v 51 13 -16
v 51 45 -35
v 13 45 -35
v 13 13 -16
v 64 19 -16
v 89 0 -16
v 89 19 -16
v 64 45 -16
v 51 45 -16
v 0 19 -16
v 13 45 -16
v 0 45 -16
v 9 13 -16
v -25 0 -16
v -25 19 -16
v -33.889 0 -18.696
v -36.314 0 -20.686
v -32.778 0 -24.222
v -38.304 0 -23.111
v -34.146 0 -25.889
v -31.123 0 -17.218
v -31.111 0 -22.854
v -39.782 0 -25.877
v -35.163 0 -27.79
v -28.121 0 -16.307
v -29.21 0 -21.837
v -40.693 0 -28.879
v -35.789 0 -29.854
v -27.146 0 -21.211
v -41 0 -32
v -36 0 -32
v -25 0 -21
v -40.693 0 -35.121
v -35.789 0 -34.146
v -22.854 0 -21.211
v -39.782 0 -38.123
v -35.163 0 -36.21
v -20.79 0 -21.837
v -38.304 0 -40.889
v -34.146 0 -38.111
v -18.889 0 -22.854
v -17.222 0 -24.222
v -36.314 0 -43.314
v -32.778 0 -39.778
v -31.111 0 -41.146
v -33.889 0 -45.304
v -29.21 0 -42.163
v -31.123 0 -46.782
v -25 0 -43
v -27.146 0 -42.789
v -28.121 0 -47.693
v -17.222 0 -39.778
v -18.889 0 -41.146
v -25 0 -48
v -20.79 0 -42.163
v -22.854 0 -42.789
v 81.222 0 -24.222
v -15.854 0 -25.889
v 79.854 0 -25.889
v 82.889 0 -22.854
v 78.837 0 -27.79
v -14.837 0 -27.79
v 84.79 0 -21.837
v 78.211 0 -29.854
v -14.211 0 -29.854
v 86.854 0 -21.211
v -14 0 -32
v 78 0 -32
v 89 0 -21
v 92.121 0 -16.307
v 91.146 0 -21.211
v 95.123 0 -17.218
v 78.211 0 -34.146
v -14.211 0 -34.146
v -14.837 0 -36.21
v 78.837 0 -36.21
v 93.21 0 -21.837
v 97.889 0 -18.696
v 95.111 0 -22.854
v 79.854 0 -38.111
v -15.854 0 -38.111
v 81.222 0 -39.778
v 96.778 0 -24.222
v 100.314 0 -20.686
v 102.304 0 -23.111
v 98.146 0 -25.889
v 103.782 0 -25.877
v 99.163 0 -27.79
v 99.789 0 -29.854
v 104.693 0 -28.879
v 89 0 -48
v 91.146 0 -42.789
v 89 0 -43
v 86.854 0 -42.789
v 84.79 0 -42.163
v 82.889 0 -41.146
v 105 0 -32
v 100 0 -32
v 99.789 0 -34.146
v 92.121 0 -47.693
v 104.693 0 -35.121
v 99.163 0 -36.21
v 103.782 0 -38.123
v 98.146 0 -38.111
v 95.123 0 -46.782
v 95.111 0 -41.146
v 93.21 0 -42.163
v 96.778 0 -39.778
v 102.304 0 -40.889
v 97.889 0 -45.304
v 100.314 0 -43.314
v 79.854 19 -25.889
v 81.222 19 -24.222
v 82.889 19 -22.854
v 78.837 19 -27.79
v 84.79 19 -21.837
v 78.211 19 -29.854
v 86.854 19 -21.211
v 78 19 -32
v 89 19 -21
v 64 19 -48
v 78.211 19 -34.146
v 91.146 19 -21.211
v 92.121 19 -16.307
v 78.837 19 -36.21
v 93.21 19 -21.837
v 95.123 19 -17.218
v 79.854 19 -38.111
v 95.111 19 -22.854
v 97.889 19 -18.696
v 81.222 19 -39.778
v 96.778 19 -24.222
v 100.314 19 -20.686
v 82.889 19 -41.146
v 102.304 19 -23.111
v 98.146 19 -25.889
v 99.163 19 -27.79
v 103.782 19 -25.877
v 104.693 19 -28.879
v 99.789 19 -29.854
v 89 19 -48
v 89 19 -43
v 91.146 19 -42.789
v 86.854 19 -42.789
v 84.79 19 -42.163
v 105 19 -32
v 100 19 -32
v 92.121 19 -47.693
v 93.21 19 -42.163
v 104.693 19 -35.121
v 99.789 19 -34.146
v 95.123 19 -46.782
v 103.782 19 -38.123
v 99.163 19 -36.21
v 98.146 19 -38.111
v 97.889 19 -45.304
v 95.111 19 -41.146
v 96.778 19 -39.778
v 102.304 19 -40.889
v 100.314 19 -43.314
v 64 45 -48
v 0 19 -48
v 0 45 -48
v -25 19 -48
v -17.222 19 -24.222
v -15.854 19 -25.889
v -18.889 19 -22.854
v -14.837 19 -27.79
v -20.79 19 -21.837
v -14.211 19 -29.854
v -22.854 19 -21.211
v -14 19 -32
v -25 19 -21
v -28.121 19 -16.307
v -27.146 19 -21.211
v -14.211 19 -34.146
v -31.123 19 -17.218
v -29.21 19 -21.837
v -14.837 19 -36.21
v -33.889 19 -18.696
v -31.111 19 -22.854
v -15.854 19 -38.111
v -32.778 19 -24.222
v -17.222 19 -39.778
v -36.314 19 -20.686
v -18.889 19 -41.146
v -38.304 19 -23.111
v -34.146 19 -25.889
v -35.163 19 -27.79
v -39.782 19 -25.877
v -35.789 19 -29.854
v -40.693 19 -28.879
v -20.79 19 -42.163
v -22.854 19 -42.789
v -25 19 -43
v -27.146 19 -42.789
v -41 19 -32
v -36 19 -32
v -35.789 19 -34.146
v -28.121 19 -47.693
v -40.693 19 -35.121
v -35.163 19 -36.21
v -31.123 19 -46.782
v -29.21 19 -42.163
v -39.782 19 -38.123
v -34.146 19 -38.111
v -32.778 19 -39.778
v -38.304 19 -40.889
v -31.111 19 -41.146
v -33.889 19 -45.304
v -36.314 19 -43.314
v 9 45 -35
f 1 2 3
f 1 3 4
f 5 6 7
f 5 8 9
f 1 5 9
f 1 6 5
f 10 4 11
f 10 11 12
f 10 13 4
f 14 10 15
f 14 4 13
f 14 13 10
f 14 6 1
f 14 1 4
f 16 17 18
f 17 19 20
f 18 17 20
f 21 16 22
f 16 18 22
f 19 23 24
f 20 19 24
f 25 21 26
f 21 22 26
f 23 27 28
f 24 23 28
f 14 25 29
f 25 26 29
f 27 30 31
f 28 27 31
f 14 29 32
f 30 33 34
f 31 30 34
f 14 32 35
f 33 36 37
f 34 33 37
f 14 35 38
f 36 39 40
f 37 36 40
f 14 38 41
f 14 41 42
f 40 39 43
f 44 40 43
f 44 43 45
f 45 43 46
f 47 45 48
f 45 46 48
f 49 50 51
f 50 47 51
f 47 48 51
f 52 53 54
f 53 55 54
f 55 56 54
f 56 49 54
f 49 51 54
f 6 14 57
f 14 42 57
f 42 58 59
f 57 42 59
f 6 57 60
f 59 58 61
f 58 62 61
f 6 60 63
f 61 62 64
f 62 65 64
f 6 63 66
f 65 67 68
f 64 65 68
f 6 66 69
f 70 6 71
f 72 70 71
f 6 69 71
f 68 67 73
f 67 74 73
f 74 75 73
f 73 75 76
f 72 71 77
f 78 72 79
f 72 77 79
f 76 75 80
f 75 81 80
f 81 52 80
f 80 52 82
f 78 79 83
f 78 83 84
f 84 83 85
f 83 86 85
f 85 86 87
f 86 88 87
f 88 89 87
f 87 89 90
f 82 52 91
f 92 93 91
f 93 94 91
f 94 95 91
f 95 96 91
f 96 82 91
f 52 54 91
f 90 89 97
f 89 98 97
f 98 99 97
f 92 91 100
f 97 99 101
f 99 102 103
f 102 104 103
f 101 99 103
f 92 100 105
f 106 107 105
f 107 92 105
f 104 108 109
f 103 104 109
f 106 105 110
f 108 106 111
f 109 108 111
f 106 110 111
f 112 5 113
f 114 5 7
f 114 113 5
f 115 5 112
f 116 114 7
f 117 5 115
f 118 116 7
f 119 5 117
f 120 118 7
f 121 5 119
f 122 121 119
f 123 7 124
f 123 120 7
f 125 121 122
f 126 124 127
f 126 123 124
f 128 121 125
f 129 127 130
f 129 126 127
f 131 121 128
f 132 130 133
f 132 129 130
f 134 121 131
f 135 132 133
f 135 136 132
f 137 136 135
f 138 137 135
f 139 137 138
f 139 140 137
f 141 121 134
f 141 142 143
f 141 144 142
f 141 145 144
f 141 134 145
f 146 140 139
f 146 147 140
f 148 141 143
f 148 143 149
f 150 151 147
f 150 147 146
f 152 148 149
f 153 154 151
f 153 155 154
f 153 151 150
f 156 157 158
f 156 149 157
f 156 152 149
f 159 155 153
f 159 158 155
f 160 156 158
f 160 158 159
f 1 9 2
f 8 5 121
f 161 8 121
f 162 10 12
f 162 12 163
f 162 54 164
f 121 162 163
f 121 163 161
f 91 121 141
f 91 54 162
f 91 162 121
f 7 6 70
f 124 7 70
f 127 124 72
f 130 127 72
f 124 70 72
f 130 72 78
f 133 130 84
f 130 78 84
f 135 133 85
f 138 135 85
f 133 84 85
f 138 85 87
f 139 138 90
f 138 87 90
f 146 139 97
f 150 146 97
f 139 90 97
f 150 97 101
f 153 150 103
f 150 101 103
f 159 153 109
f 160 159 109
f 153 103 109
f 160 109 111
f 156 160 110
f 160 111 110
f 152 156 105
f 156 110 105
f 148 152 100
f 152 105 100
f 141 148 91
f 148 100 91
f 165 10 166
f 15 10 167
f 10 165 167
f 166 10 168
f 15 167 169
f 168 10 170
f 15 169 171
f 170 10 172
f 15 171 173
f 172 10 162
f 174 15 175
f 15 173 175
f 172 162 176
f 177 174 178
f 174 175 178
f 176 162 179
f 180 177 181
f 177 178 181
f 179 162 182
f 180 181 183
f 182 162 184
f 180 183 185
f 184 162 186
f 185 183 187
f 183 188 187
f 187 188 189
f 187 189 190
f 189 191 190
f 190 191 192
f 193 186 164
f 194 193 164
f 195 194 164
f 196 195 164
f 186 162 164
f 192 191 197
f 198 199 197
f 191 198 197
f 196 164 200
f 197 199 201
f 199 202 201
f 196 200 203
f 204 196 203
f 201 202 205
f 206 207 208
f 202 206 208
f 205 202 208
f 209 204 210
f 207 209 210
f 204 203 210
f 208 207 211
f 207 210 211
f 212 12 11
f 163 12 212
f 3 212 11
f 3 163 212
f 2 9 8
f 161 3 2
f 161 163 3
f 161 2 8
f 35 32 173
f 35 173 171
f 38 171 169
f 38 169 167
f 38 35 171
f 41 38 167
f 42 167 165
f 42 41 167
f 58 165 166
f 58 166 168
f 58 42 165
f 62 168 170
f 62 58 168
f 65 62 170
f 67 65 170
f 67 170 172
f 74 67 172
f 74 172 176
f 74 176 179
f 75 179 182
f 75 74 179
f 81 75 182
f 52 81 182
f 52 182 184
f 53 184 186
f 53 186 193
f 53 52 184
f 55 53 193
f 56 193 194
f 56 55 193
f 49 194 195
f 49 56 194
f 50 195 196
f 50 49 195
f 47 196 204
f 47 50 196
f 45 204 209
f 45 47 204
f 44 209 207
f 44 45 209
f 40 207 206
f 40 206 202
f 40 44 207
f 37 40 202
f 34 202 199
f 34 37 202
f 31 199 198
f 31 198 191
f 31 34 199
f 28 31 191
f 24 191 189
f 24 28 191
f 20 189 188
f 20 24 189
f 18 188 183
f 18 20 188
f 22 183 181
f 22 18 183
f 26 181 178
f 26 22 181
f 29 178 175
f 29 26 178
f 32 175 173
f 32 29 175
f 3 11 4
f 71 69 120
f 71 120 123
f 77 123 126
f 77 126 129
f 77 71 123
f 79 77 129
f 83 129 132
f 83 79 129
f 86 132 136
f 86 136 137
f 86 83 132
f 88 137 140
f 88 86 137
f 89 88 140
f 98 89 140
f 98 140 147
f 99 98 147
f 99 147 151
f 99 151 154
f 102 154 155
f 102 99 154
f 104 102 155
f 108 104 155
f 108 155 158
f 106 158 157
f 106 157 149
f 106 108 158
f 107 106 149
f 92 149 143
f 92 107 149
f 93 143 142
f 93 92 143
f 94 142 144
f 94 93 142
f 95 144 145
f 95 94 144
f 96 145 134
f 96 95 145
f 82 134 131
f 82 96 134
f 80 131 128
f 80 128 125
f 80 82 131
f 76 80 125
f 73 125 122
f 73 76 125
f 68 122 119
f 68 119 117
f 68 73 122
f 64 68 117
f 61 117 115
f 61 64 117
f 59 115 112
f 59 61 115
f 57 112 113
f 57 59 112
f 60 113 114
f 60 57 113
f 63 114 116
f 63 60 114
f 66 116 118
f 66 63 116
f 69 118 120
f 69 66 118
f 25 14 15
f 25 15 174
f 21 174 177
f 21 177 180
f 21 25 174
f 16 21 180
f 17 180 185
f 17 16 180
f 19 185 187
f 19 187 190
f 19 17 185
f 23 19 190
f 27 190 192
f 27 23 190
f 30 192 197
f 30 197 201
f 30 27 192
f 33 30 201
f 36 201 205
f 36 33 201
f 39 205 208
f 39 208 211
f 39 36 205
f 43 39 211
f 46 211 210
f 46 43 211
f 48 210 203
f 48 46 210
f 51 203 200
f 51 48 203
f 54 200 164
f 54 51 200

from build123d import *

# Parameters (mm, degrees)
SKETCH2_W           = 64
SKETCH2_H           = 64
BOSS_EXTRUDE1_DEPTH = 45
SKETCH3_R           = 11
BOSS_EXTRUDE2_DEPTH = 19
SKETCH7_W           = 16
SKETCH7_H           = 45
CUT_EXTRUDE2_DEPTH  = 148
SKETCH9_W           = 64
SKETCH9_H           = 16
CUT_EXTRUDE4_DEPTH  = 148
SKETCH10_W          = 38
SKETCH10_H          = 19
CUT_EXTRUDE5_DEPTH  = 32
BOSS_EXTRUDE4_DEPTH = 42


with BuildPart() as part:
    # Sketch2 → Boss-Extrude1 (new body)
    with BuildSketch(Plane(origin=(0, 0, 0), x_dir=(1, 0, 0), z_dir=(0, 1, 0))):
        with Locations((32, 32)):
            Rectangle(SKETCH2_W, SKETCH2_H)
    extrude(amount=BOSS_EXTRUDE1_DEPTH)

    # Sketch3 → Boss-Extrude2 (add)
    # profile 1 of 2: a face of its own
    with BuildSketch(Plane(origin=(0, 0, 0), x_dir=(1, 0, 0), z_dir=(0, 1, 0))):
        with BuildLine():
            Line((-25, 48), (0, 48))
            Line((0, 48), (0, 16))
            Line((0, 16), (-25, 16))
            ThreePointArc((-25, 16), (-41, 32), (-25, 48))
        make_face()
        with Locations(Location((-25, 32, 0), (0, 0, 270))):
            Circle(SKETCH3_R, mode=Mode.SUBTRACT)
    # profile 2 of 2: a face of its own
    with BuildSketch(Plane(origin=(0, 0, 0), x_dir=(1, 0, 0), z_dir=(0, 1, 0))):
        with BuildLine():
            Line((89, 48), (64, 48))
            Line((64, 48), (64, 16))
            Line((64, 16), (89, 16))
            ThreePointArc((89, 16), (105, 32), (89, 48))
        make_face()
        with Locations(Location((89, 32, 0), (0, 0, 270))):
            Circle(SKETCH3_R, mode=Mode.SUBTRACT)
    extrude(amount=BOSS_EXTRUDE2_DEPTH)

    # Sketch7 → Cut-Extrude2 (cut)
    with BuildSketch(Plane.ZY):
        with Locations((-8, 22.5)):
            Rectangle(SKETCH7_W, SKETCH7_H)
    extrude(amount=-CUT_EXTRUDE2_DEPTH, mode=Mode.SUBTRACT)

    # Sketch9 → Cut-Extrude4 (cut)
    with BuildSketch(Plane(origin=(0, 45, 0), x_dir=(1, 0, 0), z_dir=(0, 1, 0))):
        with Locations((32, 56)):
            Rectangle(SKETCH9_W, SKETCH9_H)
    extrude(amount=-CUT_EXTRUDE4_DEPTH, mode=Mode.SUBTRACT)

    # Sketch10 → Cut-Extrude5 (cut)
    with BuildSketch(Plane(origin=(0, 45, 0), x_dir=(1, 0, 0), z_dir=(0, 1, 0))):
        with Locations((32, 25.5)):
            Rectangle(SKETCH10_W, SKETCH10_H)
    extrude(amount=-CUT_EXTRUDE5_DEPTH, mode=Mode.SUBTRACT)

    # Sketch12 → Boss-Extrude4 (add)
    with BuildSketch(Plane.ZY.offset(-51)):
        Polygon((-35, 45), (-16, 13), (-35, 13), align=None)
    extrude(amount=BOSS_EXTRUDE4_DEPTH)


solid = part.part
